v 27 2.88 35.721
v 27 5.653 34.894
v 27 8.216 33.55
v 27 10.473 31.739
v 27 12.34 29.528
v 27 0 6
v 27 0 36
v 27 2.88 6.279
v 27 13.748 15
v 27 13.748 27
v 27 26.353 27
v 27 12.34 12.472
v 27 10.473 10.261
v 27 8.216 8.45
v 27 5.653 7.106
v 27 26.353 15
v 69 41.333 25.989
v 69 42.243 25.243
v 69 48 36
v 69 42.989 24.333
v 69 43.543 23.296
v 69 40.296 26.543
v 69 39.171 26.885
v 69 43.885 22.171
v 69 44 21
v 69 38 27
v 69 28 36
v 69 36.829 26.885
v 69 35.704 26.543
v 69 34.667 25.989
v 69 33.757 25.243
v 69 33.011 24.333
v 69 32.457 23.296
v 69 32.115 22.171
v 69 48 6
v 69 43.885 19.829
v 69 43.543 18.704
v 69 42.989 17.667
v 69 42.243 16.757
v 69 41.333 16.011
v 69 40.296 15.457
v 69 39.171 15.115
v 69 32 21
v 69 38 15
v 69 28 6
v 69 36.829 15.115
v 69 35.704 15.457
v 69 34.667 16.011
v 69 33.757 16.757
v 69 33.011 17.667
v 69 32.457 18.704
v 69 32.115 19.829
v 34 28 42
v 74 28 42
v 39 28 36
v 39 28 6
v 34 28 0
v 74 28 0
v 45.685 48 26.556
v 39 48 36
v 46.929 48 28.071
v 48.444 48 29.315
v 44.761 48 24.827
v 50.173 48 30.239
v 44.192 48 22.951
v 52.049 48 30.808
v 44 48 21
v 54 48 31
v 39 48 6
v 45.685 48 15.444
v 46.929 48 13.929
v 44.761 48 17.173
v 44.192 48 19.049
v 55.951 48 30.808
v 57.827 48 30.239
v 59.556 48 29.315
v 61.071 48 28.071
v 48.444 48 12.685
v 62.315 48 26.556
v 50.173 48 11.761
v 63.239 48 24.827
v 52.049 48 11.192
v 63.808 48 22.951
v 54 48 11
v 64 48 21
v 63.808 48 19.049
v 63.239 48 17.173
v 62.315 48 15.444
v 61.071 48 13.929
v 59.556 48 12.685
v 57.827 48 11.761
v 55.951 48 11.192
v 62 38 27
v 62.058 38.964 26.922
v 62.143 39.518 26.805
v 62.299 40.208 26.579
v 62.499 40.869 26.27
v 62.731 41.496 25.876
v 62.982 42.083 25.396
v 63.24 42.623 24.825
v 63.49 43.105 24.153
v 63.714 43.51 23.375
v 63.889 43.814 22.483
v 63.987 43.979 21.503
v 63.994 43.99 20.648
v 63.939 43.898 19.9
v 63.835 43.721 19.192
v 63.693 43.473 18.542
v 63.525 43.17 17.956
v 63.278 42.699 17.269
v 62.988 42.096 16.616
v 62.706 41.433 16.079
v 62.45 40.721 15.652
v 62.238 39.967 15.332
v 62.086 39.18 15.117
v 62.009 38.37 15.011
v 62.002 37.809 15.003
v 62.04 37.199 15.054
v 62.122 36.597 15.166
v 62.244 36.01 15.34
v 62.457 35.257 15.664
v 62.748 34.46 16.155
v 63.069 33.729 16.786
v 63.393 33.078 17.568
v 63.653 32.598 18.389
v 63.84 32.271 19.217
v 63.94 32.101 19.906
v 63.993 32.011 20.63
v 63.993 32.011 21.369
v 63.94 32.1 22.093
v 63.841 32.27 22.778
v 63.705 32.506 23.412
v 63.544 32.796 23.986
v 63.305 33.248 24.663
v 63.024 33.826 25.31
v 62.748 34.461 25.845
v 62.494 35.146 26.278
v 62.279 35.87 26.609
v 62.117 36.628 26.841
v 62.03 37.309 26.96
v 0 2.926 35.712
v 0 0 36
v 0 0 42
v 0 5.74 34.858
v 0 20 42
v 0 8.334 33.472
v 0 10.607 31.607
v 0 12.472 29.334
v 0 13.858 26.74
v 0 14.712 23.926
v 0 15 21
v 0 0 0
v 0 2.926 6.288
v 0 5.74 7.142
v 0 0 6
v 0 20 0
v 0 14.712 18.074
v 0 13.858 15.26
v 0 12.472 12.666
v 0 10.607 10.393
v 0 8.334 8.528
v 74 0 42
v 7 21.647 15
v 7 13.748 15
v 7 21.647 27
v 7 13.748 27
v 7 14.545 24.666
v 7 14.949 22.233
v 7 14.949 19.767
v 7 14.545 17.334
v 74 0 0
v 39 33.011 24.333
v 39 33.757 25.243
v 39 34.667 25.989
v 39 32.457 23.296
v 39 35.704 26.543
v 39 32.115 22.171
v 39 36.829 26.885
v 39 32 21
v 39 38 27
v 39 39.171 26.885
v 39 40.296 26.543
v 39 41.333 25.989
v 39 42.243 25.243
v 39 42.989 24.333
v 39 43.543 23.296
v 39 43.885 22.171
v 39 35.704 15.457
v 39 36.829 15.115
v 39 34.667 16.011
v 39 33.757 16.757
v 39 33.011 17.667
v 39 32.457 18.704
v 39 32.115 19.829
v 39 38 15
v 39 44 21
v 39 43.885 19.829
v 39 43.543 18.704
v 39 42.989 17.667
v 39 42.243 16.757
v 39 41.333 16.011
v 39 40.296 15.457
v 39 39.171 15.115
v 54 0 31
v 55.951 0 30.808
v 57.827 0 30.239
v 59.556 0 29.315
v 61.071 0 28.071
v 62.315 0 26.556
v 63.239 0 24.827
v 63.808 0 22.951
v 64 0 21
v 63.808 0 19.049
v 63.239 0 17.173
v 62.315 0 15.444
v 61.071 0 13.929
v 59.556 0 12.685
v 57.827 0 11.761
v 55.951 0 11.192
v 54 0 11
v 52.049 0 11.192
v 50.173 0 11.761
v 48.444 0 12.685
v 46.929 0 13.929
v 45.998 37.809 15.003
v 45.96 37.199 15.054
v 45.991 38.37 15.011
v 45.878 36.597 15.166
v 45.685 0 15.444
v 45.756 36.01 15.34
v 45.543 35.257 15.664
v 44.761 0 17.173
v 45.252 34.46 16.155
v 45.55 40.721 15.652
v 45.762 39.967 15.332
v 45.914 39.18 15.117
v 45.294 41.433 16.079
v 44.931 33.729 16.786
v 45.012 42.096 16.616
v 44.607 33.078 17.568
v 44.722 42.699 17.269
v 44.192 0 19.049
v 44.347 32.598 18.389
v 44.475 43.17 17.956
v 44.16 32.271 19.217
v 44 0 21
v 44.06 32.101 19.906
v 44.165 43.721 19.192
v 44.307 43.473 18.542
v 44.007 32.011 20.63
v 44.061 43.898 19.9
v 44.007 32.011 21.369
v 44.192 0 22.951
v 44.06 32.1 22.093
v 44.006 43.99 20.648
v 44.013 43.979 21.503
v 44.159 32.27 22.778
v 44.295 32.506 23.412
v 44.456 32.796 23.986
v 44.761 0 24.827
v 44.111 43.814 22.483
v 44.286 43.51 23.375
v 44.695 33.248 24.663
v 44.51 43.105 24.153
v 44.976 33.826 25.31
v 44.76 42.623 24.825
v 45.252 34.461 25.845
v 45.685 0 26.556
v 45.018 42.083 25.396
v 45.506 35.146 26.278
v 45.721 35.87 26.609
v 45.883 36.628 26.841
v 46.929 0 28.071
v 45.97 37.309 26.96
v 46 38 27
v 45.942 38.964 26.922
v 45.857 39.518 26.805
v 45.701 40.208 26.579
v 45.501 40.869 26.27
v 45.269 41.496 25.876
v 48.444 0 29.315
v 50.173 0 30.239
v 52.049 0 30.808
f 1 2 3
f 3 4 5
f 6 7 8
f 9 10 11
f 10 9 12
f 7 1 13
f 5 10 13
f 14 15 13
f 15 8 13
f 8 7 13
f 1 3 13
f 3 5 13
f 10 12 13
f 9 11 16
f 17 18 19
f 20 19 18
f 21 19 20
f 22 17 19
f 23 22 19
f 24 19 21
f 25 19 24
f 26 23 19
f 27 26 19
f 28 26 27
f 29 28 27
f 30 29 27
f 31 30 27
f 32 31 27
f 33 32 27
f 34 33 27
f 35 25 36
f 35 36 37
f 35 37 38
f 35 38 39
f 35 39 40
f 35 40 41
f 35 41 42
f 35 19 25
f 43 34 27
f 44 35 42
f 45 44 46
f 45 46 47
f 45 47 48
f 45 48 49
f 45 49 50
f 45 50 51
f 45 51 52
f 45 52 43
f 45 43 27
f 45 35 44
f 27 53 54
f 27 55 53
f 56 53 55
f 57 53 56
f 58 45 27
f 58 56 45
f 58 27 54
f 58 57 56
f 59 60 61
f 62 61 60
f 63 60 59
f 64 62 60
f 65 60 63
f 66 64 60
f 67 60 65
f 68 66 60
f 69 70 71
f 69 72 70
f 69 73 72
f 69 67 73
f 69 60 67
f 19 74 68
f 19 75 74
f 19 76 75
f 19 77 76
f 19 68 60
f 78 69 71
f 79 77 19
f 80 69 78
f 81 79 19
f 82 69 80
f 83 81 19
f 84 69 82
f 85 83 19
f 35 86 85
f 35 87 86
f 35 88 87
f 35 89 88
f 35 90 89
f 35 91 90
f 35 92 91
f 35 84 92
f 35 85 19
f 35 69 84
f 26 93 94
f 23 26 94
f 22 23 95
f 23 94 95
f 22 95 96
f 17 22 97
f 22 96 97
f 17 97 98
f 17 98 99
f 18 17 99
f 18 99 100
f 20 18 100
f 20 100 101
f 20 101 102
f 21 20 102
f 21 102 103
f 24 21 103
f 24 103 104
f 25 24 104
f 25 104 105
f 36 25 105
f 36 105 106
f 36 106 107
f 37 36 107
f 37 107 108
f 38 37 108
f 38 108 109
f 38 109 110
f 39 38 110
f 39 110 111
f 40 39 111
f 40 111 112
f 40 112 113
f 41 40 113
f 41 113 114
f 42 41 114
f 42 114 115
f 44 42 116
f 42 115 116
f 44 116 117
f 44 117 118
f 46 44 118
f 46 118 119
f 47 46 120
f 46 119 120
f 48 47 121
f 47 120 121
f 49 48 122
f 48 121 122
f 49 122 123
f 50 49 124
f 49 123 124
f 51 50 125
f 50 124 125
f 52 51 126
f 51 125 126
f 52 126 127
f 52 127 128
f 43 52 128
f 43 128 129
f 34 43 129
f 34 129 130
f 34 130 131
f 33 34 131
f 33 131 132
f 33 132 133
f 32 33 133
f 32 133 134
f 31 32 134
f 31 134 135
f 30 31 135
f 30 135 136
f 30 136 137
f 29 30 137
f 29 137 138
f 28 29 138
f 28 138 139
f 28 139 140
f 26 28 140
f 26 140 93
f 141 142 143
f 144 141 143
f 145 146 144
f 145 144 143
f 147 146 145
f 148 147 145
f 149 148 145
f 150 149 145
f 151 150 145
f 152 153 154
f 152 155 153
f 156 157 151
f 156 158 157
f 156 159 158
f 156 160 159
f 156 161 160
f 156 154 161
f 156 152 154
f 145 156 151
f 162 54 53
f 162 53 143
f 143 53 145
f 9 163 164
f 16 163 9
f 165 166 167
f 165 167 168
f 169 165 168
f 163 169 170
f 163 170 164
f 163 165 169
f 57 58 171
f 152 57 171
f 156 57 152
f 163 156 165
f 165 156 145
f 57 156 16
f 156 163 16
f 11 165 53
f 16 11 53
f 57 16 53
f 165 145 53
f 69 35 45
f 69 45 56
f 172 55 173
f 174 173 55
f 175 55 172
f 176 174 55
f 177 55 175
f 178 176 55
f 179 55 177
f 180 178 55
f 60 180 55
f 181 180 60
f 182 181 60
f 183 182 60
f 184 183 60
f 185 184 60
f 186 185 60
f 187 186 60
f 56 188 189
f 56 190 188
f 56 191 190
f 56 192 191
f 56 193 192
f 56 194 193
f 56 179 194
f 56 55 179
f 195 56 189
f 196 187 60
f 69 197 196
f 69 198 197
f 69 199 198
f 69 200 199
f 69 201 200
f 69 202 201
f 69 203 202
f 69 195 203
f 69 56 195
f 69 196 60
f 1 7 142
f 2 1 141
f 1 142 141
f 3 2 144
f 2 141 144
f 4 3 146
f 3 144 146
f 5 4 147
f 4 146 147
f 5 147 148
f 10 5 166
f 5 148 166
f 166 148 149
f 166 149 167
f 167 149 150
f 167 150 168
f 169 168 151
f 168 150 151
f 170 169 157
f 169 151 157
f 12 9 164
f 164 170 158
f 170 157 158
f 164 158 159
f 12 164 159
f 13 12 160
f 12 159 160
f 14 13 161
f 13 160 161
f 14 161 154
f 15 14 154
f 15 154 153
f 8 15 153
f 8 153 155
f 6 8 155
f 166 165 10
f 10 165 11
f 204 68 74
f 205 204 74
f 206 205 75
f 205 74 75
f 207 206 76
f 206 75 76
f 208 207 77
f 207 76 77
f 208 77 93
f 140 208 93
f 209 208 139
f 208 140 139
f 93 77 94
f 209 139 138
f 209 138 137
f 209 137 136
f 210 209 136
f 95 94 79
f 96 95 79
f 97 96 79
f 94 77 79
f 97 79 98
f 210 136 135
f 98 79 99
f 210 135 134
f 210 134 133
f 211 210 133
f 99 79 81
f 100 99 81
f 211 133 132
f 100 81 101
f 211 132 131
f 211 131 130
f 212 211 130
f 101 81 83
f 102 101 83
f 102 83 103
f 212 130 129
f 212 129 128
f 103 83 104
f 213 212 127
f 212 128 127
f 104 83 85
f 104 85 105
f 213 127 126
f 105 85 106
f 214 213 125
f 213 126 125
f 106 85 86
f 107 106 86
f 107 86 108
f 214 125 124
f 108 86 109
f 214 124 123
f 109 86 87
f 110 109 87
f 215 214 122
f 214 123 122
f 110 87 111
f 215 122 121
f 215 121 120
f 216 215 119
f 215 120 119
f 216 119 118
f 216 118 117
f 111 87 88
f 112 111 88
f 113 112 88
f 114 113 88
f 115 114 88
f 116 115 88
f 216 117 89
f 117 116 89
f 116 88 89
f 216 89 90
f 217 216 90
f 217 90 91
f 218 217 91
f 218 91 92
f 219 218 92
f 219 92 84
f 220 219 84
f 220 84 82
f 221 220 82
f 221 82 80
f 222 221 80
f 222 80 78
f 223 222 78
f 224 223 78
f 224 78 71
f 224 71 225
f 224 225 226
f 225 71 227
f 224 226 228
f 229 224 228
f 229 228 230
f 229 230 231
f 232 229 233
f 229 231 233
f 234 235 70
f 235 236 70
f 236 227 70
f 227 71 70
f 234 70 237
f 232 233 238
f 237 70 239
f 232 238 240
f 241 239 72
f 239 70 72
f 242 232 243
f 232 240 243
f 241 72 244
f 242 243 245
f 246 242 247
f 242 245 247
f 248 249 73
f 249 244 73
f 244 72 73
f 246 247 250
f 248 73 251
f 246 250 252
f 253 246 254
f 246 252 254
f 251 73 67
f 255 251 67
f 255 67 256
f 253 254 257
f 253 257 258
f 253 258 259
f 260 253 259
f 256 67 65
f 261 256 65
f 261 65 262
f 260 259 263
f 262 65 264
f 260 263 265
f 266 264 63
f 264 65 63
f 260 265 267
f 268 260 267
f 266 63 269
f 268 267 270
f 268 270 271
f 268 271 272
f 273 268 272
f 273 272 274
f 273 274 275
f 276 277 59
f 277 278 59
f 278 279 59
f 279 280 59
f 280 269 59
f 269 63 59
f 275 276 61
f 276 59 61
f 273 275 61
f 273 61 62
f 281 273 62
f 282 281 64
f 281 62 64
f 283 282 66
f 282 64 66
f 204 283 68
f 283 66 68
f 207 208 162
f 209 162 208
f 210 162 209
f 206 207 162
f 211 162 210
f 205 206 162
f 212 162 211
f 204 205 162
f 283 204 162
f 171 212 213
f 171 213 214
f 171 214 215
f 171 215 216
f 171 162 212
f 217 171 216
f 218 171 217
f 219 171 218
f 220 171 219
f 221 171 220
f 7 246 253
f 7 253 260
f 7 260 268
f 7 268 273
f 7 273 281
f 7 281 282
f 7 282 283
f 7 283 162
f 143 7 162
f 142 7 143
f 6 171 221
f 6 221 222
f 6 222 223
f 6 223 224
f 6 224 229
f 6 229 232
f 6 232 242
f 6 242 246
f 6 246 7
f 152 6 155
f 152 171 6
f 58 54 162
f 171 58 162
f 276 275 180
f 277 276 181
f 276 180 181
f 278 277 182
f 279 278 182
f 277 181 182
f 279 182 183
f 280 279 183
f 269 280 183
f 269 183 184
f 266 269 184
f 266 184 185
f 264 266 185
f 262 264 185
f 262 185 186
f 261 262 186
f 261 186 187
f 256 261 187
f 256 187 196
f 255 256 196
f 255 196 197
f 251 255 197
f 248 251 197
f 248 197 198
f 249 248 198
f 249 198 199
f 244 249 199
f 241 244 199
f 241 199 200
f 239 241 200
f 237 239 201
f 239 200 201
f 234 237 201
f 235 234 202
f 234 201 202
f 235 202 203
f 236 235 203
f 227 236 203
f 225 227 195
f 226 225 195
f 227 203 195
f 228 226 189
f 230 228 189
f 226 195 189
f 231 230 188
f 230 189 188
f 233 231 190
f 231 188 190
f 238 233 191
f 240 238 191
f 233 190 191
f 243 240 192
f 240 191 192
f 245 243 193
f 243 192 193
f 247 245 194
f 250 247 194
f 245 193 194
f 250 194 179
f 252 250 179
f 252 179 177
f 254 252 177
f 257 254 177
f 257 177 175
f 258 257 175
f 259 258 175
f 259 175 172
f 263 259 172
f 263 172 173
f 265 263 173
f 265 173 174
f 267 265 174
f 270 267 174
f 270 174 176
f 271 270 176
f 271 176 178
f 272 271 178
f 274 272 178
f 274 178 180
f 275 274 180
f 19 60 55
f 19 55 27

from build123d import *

# Parameters (mm, degrees)
BOSS_EXTRUDE1_DEPTH = 42
SKETCH3_W           = 20
SKETCH3_H           = 12
CUT_EXTRUDE1_DEPTH  = 42
CUT_EXTRUDE2_DEPTH  = 45
SKETCH5_W           = 30
SKETCH5_H           = 20
CUT_EXTRUDE3_DEPTH  = 6
SKETCH6_W           = 30
SKETCH6_H           = 20
CUT_EXTRUDE4_DEPTH  = 6
CUT_EXTRUDE5_DEPTH  = 27
SKETCH8_R           = 6
CUT_EXTRUDE6_DEPTH  = 42
SKETCH9_R           = 7.5
CUT_EXTRUDE7_DEPTH  = 70
CUT_EXTRUDE8_DEPTH  = 27
SKETCH11_R          = 10
CUT_EXTRUDE9_DEPTH  = 58


with BuildPart() as part:
    # Sketch2 → Boss-Extrude1 (new body)
    with BuildSketch(Plane.XY):
        Polygon((0, 28), (39, 28), (39, 48), (69, 48), (69, 28), (74, 28), (74, 0), (0, 0), align=None)
    extrude(amount=BOSS_EXTRUDE1_DEPTH)

    # Sketch3 → Cut-Extrude1 (cut)
    with BuildSketch(Plane(origin=(0, 28, 0), x_dir=(1, 0, 0), z_dir=(0, 1, 0))):
        with Locations((17, -21)):
            Rectangle(SKETCH3_W, SKETCH3_H)
    extrude(amount=-CUT_EXTRUDE1_DEPTH, mode=Mode.SUBTRACT)

    # Sketch4 → Cut-Extrude2 (cut)
    with BuildSketch(Plane.XY.offset(42)):
        Polygon((0, 20), (34, 28), (0, 28), align=None)
    extrude(amount=-CUT_EXTRUDE2_DEPTH, mode=Mode.SUBTRACT)

    # Sketch5 → Cut-Extrude3 (cut)
    with BuildSketch(Plane.XY.offset(42)):
        with Locations((54, 38)):
            Rectangle(SKETCH5_W, SKETCH5_H)
    extrude(amount=-CUT_EXTRUDE3_DEPTH, mode=Mode.SUBTRACT)

    # Sketch6 → Cut-Extrude4 (cut)
    with BuildSketch(Plane(origin=(0, 0, 0), x_dir=(-1, 0, 0), z_dir=(0, 0, -1))):
        with Locations((-54, 38)):
            Rectangle(SKETCH6_W, SKETCH6_H)
    extrude(amount=-CUT_EXTRUDE4_DEPTH, mode=Mode.SUBTRACT)

    # Sketch7 → Cut-Extrude5 (cut)
    with BuildSketch(Plane.ZY):
        with BuildLine():
            ThreePointArc((13.5, 0), (21, -7.5), (28.5, 0))
            Line((28.5, 0), (13.5, 0))
        make_face()
        with BuildLine():
            Line((13.5, 0), (28.5, 0))
            ThreePointArc((28.5, 0), (21, 7.5), (13.5, 0))
        make_face()
    extrude(amount=-CUT_EXTRUDE5_DEPTH, mode=Mode.SUBTRACT)

    # Sketch8 → Cut-Extrude6 (cut)
    with BuildSketch(Plane.ZY.offset(-39)):
        with Locations((21, 38)):
            Circle(SKETCH8_R)
    extrude(amount=-CUT_EXTRUDE6_DEPTH, mode=Mode.SUBTRACT)

    # Sketch9 → Cut-Extrude7 (cut)
    with BuildSketch(Plane(origin=(0, 48, 0), x_dir=(1, 0, 0), z_dir=(0, 1, 0))):
        with Locations(Location((54, -21, 0), (0, 0, 270))):
            Circle(SKETCH9_R)
    extrude(amount=-CUT_EXTRUDE7_DEPTH, mode=Mode.SUBTRACT)

    # Sketch10 → Cut-Extrude8 (cut)
    with BuildSketch(Plane.ZY):
        with BuildLine():
            ThreePointArc((36, 0), (21, 15), (6, 0))
            Line((6, 0), (13.5, 0))
            ThreePointArc((13.5, 0), (21, 7.5), (28.5, 0))
            Line((28.5, 0), (36, 0))
        make_face()
        with BuildLine():
            Line((13.5, 0), (6, 0))
            ThreePointArc((6, 0), (21, -15), (36, 0))
            Line((36, 0), (28.5, 0))
            ThreePointArc((28.5, 0), (21, 7.5), (13.5, 0))
        make_face()
    extrude(amount=-CUT_EXTRUDE8_DEPTH, mode=Mode.SUBTRACT)

    # Sketch11 → Cut-Extrude9 (cut)
    with BuildSketch(Plane(origin=(0, 48, 0), x_dir=(1, 0, 0), z_dir=(0, 1, 0))):
        with Locations(Location((54, -21, 0), (0, 0, 270))):
            Circle(SKETCH11_R)
    extrude(amount=-CUT_EXTRUDE9_DEPTH, mode=Mode.SUBTRACT)


solid = part.part
